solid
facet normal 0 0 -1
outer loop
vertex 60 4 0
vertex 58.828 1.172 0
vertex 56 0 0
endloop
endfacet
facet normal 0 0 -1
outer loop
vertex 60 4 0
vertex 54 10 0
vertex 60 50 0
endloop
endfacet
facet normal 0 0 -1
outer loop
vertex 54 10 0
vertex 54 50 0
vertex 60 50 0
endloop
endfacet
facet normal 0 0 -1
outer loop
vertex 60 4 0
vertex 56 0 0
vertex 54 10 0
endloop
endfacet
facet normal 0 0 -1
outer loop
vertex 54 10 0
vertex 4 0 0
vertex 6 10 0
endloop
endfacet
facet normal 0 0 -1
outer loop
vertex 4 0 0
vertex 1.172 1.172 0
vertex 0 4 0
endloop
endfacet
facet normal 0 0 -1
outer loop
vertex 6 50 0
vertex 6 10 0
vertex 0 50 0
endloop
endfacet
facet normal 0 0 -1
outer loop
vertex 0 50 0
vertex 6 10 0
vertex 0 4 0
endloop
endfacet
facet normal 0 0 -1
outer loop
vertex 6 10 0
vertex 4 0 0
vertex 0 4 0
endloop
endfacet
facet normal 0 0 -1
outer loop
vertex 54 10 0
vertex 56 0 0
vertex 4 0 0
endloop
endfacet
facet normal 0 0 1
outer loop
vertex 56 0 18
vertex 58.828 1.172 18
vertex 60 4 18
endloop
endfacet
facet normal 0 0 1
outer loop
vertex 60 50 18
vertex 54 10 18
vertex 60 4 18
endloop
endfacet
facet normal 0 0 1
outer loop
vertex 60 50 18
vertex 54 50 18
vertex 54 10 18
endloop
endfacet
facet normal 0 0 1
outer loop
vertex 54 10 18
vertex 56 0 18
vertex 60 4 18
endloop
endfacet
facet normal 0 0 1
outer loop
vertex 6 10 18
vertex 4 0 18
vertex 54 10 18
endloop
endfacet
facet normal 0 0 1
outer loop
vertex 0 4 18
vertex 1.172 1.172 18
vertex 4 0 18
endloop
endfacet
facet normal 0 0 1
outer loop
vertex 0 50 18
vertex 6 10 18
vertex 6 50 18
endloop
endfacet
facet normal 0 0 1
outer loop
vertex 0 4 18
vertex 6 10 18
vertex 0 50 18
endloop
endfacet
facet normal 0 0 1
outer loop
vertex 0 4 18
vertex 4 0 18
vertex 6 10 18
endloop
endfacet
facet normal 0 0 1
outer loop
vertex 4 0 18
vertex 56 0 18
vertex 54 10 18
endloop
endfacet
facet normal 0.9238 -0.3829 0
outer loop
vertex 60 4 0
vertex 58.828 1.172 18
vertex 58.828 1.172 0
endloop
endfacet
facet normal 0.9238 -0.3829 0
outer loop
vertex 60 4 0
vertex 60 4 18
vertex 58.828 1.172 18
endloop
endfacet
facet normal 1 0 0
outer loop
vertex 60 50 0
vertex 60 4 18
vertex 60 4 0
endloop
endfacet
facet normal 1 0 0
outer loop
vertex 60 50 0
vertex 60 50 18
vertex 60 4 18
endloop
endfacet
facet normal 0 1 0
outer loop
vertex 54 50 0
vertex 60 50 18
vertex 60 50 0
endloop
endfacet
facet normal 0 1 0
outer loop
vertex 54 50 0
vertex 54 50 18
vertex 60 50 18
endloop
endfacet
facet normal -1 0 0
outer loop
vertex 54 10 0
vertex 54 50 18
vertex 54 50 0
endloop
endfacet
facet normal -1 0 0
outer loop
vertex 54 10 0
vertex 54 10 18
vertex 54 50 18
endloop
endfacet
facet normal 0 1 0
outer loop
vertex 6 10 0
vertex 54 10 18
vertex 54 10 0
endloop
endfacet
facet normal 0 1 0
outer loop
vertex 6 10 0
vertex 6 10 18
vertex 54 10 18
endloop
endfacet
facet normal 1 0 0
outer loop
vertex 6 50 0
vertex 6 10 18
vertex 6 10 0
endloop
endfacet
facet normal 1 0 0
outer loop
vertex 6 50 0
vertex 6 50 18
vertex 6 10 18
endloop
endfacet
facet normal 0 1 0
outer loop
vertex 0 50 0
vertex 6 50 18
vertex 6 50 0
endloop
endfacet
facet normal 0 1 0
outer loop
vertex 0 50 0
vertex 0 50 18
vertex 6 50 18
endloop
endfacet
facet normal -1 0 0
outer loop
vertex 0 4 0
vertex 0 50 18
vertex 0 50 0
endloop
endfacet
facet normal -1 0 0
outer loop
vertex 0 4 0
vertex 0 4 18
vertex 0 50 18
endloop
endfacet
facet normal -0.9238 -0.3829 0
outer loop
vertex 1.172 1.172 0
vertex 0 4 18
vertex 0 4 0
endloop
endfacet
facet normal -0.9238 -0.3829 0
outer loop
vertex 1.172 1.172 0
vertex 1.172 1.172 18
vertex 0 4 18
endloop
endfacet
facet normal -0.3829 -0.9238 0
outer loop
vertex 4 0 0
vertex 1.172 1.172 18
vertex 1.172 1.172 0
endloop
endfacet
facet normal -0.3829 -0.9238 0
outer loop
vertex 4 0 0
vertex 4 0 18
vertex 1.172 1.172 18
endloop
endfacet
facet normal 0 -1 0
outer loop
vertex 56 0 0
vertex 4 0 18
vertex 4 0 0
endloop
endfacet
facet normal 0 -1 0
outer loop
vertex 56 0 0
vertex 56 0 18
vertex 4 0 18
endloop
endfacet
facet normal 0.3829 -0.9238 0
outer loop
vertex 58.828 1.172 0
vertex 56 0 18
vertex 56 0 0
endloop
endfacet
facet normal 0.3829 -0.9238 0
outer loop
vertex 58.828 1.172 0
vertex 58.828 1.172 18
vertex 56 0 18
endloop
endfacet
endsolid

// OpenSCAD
$fn = 32;

// ----------------------------------------------------------------------
// Heat sink frame: 60 x 50 mm frame, 6 mm walls
// ----------------------------------------------------------------------

// --- parameters (mm) ---
profile_height = 18;      // extrusion height
profile_points = 12;      // points of the closed outline

profile = [[0, 4], [1.172, 1.172], [4, 0], [56, 0], [58.828, 1.172], [60, 4], [60, 50], [54, 50], [54, 10], [6, 10], [6, 50], [0, 50]];  // single closed polygon, 12 points, counter clockwise

// --- the one profile operation ---
linear_extrude(height = profile_height) polygon(points = profile);
